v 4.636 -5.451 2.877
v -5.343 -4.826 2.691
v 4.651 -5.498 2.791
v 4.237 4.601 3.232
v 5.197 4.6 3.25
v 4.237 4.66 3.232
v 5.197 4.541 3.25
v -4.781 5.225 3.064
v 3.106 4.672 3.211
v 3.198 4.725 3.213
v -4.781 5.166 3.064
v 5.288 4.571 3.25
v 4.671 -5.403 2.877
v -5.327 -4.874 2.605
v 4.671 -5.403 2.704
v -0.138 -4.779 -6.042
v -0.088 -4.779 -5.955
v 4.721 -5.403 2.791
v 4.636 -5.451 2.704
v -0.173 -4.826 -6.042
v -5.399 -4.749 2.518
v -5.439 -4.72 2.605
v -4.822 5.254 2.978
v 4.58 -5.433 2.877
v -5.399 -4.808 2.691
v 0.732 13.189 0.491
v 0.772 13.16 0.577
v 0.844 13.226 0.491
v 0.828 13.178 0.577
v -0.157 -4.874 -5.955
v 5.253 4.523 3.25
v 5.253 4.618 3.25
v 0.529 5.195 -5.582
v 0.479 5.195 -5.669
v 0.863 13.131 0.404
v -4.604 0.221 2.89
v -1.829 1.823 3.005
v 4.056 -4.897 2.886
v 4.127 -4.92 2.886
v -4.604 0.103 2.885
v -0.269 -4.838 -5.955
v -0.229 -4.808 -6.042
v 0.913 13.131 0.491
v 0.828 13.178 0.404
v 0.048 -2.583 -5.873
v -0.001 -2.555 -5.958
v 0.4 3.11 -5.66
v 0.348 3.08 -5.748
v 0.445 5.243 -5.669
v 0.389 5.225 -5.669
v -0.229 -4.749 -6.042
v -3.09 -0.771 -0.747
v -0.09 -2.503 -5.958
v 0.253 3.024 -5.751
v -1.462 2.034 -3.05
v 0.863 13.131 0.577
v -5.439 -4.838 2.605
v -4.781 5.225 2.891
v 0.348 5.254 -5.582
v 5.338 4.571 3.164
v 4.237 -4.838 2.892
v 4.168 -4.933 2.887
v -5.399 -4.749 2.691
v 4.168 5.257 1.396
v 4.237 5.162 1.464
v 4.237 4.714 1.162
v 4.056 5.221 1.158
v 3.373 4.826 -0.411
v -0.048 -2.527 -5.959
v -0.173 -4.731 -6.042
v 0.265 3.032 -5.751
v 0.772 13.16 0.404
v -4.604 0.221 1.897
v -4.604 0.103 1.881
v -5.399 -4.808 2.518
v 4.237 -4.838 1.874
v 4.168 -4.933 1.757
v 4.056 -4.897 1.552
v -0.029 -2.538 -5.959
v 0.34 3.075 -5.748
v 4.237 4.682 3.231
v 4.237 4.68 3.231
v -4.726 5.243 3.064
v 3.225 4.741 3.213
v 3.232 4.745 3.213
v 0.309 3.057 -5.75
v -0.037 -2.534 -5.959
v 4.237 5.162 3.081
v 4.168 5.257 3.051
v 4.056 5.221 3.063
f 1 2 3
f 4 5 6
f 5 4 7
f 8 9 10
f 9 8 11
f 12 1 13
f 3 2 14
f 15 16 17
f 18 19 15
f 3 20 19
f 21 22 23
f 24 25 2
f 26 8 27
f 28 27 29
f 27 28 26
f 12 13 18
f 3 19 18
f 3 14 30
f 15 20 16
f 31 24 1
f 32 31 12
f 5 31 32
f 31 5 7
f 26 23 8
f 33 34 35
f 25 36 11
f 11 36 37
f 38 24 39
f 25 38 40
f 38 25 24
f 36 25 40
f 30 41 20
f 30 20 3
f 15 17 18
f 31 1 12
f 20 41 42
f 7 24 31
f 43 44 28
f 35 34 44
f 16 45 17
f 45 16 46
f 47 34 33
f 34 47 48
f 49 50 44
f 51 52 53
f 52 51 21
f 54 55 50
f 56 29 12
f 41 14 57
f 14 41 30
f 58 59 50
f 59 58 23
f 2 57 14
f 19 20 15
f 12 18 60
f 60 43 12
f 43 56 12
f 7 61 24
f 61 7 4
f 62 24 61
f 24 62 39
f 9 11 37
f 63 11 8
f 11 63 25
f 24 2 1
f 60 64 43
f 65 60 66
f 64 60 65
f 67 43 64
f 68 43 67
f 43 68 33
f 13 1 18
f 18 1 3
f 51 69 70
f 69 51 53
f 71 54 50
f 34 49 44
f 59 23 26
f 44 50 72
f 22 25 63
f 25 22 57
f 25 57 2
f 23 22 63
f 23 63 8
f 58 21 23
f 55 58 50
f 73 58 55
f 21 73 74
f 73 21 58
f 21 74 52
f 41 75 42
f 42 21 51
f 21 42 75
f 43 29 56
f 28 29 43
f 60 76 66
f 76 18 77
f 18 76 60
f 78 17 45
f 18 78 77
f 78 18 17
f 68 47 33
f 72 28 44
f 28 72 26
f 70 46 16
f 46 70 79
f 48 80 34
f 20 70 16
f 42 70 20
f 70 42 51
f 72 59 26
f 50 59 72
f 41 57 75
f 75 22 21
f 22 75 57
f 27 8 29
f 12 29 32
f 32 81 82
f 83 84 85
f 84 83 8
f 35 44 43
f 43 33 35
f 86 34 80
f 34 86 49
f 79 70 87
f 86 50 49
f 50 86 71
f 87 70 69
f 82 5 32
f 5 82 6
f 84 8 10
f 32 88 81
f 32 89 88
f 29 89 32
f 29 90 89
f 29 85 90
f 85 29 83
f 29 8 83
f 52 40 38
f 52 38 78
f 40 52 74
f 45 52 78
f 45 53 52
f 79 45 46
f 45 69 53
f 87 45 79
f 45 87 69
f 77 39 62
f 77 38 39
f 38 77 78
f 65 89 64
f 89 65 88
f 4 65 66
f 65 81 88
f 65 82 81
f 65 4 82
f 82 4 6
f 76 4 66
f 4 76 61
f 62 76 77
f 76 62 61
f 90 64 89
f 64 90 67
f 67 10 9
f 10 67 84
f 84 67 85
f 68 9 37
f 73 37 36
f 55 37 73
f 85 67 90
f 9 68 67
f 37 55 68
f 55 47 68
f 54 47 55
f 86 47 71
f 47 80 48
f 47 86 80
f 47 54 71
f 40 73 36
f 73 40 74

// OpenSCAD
// Auto-generated OpenSCAD file

    inner_points = 10*[[0.41372241203438104, 0.5161844232125496, -0.5000000000005286], [0.41372241203630644, 0.5161844232124951, 0.4999999999994715], [-0.4523012409070252, 0.01618139067572292, -0.49999999999888844], [-0.45230124090509977, 0.01618139067566849, 0.5000000000011117], [0.4137259137098271, -0.48381557678131953, -0.500000000000583], [0.41372591371175244, -0.483815576781374, 0.49999999999941697], [0.125049028277489, 0.016183412369028788, -1.316496580927726]];

    outer_points = 10*[[-0.47409817149378863, 0.5195152510494393, 0.29777199506773233], [-0.5358247145183108, -0.47788127840371986, 0.2604893325952726], [0.04291122844378145, 0.5195152510494393, -0.5582077245379332], [-0.018815314580740705, -0.47788127840371986, -0.5954903870103929], [0.5237767575867904, 0.4570642920808602, 0.3163597231788905], [0.4620502145622683, -0.540332237372299, 0.2790770607064307], [0.08126278284427152, 1.313069120854264, 0.049082497672875716]];

    // Convex hull for inner set (I)
    module inner_hull() {
        hull() {
            for (p = inner_points) {
                translate(p) sphere(r=0.1);
            }
        }
    }

    // Convex hull for outer set (O) minus inner hull (O \ I)
    module outer_minus_inner() {
        difference() {
            hull() {
                for (p = outer_points) {
                    translate(p) sphere(r=0.1);
                }
            }
            inner_hull(); // Subtract inner hull
        }
    }

    // Convex hull for outer set (O) minus all translated inner hulls
    module outer_minus_AllTranslationInner() {
        difference() {
            hull() {
                for (p = outer_points) {
                    translate(p) sphere(r=0.1);
                }
            }
            hull() {
                translate([0,0,50]) inner_hull();
                translate([0,0,-50]) inner_hull();
            }; // Subtract translated inner hulls
        }
    }

    // Difference between outer_minus_inner and outer_minus_AllTranslationInner
    module outer_minus_inner_diff() {
        difference() {
            // Outer minus inner
            difference() {
                hull() {
                    for (p = outer_points) {
                        translate(p) sphere(r=0.1);
                    }
                }
                inner_hull();
            }

            // Subtract Outer minus AllTranslationInner
            difference() {
                hull() {
                    for (p = outer_points) {
                        translate(p) sphere(r=0.1);
                    }
                }
                hull() {
                    translate([0,0,50]) inner_hull();
                    translate([0,0,-50]) inner_hull();
                };
            }
        }
    }

    // Rendering all with colors applied
    color([0, 1, 0, 1]) outer_minus_AllTranslationInner(); // Opaque green
    
